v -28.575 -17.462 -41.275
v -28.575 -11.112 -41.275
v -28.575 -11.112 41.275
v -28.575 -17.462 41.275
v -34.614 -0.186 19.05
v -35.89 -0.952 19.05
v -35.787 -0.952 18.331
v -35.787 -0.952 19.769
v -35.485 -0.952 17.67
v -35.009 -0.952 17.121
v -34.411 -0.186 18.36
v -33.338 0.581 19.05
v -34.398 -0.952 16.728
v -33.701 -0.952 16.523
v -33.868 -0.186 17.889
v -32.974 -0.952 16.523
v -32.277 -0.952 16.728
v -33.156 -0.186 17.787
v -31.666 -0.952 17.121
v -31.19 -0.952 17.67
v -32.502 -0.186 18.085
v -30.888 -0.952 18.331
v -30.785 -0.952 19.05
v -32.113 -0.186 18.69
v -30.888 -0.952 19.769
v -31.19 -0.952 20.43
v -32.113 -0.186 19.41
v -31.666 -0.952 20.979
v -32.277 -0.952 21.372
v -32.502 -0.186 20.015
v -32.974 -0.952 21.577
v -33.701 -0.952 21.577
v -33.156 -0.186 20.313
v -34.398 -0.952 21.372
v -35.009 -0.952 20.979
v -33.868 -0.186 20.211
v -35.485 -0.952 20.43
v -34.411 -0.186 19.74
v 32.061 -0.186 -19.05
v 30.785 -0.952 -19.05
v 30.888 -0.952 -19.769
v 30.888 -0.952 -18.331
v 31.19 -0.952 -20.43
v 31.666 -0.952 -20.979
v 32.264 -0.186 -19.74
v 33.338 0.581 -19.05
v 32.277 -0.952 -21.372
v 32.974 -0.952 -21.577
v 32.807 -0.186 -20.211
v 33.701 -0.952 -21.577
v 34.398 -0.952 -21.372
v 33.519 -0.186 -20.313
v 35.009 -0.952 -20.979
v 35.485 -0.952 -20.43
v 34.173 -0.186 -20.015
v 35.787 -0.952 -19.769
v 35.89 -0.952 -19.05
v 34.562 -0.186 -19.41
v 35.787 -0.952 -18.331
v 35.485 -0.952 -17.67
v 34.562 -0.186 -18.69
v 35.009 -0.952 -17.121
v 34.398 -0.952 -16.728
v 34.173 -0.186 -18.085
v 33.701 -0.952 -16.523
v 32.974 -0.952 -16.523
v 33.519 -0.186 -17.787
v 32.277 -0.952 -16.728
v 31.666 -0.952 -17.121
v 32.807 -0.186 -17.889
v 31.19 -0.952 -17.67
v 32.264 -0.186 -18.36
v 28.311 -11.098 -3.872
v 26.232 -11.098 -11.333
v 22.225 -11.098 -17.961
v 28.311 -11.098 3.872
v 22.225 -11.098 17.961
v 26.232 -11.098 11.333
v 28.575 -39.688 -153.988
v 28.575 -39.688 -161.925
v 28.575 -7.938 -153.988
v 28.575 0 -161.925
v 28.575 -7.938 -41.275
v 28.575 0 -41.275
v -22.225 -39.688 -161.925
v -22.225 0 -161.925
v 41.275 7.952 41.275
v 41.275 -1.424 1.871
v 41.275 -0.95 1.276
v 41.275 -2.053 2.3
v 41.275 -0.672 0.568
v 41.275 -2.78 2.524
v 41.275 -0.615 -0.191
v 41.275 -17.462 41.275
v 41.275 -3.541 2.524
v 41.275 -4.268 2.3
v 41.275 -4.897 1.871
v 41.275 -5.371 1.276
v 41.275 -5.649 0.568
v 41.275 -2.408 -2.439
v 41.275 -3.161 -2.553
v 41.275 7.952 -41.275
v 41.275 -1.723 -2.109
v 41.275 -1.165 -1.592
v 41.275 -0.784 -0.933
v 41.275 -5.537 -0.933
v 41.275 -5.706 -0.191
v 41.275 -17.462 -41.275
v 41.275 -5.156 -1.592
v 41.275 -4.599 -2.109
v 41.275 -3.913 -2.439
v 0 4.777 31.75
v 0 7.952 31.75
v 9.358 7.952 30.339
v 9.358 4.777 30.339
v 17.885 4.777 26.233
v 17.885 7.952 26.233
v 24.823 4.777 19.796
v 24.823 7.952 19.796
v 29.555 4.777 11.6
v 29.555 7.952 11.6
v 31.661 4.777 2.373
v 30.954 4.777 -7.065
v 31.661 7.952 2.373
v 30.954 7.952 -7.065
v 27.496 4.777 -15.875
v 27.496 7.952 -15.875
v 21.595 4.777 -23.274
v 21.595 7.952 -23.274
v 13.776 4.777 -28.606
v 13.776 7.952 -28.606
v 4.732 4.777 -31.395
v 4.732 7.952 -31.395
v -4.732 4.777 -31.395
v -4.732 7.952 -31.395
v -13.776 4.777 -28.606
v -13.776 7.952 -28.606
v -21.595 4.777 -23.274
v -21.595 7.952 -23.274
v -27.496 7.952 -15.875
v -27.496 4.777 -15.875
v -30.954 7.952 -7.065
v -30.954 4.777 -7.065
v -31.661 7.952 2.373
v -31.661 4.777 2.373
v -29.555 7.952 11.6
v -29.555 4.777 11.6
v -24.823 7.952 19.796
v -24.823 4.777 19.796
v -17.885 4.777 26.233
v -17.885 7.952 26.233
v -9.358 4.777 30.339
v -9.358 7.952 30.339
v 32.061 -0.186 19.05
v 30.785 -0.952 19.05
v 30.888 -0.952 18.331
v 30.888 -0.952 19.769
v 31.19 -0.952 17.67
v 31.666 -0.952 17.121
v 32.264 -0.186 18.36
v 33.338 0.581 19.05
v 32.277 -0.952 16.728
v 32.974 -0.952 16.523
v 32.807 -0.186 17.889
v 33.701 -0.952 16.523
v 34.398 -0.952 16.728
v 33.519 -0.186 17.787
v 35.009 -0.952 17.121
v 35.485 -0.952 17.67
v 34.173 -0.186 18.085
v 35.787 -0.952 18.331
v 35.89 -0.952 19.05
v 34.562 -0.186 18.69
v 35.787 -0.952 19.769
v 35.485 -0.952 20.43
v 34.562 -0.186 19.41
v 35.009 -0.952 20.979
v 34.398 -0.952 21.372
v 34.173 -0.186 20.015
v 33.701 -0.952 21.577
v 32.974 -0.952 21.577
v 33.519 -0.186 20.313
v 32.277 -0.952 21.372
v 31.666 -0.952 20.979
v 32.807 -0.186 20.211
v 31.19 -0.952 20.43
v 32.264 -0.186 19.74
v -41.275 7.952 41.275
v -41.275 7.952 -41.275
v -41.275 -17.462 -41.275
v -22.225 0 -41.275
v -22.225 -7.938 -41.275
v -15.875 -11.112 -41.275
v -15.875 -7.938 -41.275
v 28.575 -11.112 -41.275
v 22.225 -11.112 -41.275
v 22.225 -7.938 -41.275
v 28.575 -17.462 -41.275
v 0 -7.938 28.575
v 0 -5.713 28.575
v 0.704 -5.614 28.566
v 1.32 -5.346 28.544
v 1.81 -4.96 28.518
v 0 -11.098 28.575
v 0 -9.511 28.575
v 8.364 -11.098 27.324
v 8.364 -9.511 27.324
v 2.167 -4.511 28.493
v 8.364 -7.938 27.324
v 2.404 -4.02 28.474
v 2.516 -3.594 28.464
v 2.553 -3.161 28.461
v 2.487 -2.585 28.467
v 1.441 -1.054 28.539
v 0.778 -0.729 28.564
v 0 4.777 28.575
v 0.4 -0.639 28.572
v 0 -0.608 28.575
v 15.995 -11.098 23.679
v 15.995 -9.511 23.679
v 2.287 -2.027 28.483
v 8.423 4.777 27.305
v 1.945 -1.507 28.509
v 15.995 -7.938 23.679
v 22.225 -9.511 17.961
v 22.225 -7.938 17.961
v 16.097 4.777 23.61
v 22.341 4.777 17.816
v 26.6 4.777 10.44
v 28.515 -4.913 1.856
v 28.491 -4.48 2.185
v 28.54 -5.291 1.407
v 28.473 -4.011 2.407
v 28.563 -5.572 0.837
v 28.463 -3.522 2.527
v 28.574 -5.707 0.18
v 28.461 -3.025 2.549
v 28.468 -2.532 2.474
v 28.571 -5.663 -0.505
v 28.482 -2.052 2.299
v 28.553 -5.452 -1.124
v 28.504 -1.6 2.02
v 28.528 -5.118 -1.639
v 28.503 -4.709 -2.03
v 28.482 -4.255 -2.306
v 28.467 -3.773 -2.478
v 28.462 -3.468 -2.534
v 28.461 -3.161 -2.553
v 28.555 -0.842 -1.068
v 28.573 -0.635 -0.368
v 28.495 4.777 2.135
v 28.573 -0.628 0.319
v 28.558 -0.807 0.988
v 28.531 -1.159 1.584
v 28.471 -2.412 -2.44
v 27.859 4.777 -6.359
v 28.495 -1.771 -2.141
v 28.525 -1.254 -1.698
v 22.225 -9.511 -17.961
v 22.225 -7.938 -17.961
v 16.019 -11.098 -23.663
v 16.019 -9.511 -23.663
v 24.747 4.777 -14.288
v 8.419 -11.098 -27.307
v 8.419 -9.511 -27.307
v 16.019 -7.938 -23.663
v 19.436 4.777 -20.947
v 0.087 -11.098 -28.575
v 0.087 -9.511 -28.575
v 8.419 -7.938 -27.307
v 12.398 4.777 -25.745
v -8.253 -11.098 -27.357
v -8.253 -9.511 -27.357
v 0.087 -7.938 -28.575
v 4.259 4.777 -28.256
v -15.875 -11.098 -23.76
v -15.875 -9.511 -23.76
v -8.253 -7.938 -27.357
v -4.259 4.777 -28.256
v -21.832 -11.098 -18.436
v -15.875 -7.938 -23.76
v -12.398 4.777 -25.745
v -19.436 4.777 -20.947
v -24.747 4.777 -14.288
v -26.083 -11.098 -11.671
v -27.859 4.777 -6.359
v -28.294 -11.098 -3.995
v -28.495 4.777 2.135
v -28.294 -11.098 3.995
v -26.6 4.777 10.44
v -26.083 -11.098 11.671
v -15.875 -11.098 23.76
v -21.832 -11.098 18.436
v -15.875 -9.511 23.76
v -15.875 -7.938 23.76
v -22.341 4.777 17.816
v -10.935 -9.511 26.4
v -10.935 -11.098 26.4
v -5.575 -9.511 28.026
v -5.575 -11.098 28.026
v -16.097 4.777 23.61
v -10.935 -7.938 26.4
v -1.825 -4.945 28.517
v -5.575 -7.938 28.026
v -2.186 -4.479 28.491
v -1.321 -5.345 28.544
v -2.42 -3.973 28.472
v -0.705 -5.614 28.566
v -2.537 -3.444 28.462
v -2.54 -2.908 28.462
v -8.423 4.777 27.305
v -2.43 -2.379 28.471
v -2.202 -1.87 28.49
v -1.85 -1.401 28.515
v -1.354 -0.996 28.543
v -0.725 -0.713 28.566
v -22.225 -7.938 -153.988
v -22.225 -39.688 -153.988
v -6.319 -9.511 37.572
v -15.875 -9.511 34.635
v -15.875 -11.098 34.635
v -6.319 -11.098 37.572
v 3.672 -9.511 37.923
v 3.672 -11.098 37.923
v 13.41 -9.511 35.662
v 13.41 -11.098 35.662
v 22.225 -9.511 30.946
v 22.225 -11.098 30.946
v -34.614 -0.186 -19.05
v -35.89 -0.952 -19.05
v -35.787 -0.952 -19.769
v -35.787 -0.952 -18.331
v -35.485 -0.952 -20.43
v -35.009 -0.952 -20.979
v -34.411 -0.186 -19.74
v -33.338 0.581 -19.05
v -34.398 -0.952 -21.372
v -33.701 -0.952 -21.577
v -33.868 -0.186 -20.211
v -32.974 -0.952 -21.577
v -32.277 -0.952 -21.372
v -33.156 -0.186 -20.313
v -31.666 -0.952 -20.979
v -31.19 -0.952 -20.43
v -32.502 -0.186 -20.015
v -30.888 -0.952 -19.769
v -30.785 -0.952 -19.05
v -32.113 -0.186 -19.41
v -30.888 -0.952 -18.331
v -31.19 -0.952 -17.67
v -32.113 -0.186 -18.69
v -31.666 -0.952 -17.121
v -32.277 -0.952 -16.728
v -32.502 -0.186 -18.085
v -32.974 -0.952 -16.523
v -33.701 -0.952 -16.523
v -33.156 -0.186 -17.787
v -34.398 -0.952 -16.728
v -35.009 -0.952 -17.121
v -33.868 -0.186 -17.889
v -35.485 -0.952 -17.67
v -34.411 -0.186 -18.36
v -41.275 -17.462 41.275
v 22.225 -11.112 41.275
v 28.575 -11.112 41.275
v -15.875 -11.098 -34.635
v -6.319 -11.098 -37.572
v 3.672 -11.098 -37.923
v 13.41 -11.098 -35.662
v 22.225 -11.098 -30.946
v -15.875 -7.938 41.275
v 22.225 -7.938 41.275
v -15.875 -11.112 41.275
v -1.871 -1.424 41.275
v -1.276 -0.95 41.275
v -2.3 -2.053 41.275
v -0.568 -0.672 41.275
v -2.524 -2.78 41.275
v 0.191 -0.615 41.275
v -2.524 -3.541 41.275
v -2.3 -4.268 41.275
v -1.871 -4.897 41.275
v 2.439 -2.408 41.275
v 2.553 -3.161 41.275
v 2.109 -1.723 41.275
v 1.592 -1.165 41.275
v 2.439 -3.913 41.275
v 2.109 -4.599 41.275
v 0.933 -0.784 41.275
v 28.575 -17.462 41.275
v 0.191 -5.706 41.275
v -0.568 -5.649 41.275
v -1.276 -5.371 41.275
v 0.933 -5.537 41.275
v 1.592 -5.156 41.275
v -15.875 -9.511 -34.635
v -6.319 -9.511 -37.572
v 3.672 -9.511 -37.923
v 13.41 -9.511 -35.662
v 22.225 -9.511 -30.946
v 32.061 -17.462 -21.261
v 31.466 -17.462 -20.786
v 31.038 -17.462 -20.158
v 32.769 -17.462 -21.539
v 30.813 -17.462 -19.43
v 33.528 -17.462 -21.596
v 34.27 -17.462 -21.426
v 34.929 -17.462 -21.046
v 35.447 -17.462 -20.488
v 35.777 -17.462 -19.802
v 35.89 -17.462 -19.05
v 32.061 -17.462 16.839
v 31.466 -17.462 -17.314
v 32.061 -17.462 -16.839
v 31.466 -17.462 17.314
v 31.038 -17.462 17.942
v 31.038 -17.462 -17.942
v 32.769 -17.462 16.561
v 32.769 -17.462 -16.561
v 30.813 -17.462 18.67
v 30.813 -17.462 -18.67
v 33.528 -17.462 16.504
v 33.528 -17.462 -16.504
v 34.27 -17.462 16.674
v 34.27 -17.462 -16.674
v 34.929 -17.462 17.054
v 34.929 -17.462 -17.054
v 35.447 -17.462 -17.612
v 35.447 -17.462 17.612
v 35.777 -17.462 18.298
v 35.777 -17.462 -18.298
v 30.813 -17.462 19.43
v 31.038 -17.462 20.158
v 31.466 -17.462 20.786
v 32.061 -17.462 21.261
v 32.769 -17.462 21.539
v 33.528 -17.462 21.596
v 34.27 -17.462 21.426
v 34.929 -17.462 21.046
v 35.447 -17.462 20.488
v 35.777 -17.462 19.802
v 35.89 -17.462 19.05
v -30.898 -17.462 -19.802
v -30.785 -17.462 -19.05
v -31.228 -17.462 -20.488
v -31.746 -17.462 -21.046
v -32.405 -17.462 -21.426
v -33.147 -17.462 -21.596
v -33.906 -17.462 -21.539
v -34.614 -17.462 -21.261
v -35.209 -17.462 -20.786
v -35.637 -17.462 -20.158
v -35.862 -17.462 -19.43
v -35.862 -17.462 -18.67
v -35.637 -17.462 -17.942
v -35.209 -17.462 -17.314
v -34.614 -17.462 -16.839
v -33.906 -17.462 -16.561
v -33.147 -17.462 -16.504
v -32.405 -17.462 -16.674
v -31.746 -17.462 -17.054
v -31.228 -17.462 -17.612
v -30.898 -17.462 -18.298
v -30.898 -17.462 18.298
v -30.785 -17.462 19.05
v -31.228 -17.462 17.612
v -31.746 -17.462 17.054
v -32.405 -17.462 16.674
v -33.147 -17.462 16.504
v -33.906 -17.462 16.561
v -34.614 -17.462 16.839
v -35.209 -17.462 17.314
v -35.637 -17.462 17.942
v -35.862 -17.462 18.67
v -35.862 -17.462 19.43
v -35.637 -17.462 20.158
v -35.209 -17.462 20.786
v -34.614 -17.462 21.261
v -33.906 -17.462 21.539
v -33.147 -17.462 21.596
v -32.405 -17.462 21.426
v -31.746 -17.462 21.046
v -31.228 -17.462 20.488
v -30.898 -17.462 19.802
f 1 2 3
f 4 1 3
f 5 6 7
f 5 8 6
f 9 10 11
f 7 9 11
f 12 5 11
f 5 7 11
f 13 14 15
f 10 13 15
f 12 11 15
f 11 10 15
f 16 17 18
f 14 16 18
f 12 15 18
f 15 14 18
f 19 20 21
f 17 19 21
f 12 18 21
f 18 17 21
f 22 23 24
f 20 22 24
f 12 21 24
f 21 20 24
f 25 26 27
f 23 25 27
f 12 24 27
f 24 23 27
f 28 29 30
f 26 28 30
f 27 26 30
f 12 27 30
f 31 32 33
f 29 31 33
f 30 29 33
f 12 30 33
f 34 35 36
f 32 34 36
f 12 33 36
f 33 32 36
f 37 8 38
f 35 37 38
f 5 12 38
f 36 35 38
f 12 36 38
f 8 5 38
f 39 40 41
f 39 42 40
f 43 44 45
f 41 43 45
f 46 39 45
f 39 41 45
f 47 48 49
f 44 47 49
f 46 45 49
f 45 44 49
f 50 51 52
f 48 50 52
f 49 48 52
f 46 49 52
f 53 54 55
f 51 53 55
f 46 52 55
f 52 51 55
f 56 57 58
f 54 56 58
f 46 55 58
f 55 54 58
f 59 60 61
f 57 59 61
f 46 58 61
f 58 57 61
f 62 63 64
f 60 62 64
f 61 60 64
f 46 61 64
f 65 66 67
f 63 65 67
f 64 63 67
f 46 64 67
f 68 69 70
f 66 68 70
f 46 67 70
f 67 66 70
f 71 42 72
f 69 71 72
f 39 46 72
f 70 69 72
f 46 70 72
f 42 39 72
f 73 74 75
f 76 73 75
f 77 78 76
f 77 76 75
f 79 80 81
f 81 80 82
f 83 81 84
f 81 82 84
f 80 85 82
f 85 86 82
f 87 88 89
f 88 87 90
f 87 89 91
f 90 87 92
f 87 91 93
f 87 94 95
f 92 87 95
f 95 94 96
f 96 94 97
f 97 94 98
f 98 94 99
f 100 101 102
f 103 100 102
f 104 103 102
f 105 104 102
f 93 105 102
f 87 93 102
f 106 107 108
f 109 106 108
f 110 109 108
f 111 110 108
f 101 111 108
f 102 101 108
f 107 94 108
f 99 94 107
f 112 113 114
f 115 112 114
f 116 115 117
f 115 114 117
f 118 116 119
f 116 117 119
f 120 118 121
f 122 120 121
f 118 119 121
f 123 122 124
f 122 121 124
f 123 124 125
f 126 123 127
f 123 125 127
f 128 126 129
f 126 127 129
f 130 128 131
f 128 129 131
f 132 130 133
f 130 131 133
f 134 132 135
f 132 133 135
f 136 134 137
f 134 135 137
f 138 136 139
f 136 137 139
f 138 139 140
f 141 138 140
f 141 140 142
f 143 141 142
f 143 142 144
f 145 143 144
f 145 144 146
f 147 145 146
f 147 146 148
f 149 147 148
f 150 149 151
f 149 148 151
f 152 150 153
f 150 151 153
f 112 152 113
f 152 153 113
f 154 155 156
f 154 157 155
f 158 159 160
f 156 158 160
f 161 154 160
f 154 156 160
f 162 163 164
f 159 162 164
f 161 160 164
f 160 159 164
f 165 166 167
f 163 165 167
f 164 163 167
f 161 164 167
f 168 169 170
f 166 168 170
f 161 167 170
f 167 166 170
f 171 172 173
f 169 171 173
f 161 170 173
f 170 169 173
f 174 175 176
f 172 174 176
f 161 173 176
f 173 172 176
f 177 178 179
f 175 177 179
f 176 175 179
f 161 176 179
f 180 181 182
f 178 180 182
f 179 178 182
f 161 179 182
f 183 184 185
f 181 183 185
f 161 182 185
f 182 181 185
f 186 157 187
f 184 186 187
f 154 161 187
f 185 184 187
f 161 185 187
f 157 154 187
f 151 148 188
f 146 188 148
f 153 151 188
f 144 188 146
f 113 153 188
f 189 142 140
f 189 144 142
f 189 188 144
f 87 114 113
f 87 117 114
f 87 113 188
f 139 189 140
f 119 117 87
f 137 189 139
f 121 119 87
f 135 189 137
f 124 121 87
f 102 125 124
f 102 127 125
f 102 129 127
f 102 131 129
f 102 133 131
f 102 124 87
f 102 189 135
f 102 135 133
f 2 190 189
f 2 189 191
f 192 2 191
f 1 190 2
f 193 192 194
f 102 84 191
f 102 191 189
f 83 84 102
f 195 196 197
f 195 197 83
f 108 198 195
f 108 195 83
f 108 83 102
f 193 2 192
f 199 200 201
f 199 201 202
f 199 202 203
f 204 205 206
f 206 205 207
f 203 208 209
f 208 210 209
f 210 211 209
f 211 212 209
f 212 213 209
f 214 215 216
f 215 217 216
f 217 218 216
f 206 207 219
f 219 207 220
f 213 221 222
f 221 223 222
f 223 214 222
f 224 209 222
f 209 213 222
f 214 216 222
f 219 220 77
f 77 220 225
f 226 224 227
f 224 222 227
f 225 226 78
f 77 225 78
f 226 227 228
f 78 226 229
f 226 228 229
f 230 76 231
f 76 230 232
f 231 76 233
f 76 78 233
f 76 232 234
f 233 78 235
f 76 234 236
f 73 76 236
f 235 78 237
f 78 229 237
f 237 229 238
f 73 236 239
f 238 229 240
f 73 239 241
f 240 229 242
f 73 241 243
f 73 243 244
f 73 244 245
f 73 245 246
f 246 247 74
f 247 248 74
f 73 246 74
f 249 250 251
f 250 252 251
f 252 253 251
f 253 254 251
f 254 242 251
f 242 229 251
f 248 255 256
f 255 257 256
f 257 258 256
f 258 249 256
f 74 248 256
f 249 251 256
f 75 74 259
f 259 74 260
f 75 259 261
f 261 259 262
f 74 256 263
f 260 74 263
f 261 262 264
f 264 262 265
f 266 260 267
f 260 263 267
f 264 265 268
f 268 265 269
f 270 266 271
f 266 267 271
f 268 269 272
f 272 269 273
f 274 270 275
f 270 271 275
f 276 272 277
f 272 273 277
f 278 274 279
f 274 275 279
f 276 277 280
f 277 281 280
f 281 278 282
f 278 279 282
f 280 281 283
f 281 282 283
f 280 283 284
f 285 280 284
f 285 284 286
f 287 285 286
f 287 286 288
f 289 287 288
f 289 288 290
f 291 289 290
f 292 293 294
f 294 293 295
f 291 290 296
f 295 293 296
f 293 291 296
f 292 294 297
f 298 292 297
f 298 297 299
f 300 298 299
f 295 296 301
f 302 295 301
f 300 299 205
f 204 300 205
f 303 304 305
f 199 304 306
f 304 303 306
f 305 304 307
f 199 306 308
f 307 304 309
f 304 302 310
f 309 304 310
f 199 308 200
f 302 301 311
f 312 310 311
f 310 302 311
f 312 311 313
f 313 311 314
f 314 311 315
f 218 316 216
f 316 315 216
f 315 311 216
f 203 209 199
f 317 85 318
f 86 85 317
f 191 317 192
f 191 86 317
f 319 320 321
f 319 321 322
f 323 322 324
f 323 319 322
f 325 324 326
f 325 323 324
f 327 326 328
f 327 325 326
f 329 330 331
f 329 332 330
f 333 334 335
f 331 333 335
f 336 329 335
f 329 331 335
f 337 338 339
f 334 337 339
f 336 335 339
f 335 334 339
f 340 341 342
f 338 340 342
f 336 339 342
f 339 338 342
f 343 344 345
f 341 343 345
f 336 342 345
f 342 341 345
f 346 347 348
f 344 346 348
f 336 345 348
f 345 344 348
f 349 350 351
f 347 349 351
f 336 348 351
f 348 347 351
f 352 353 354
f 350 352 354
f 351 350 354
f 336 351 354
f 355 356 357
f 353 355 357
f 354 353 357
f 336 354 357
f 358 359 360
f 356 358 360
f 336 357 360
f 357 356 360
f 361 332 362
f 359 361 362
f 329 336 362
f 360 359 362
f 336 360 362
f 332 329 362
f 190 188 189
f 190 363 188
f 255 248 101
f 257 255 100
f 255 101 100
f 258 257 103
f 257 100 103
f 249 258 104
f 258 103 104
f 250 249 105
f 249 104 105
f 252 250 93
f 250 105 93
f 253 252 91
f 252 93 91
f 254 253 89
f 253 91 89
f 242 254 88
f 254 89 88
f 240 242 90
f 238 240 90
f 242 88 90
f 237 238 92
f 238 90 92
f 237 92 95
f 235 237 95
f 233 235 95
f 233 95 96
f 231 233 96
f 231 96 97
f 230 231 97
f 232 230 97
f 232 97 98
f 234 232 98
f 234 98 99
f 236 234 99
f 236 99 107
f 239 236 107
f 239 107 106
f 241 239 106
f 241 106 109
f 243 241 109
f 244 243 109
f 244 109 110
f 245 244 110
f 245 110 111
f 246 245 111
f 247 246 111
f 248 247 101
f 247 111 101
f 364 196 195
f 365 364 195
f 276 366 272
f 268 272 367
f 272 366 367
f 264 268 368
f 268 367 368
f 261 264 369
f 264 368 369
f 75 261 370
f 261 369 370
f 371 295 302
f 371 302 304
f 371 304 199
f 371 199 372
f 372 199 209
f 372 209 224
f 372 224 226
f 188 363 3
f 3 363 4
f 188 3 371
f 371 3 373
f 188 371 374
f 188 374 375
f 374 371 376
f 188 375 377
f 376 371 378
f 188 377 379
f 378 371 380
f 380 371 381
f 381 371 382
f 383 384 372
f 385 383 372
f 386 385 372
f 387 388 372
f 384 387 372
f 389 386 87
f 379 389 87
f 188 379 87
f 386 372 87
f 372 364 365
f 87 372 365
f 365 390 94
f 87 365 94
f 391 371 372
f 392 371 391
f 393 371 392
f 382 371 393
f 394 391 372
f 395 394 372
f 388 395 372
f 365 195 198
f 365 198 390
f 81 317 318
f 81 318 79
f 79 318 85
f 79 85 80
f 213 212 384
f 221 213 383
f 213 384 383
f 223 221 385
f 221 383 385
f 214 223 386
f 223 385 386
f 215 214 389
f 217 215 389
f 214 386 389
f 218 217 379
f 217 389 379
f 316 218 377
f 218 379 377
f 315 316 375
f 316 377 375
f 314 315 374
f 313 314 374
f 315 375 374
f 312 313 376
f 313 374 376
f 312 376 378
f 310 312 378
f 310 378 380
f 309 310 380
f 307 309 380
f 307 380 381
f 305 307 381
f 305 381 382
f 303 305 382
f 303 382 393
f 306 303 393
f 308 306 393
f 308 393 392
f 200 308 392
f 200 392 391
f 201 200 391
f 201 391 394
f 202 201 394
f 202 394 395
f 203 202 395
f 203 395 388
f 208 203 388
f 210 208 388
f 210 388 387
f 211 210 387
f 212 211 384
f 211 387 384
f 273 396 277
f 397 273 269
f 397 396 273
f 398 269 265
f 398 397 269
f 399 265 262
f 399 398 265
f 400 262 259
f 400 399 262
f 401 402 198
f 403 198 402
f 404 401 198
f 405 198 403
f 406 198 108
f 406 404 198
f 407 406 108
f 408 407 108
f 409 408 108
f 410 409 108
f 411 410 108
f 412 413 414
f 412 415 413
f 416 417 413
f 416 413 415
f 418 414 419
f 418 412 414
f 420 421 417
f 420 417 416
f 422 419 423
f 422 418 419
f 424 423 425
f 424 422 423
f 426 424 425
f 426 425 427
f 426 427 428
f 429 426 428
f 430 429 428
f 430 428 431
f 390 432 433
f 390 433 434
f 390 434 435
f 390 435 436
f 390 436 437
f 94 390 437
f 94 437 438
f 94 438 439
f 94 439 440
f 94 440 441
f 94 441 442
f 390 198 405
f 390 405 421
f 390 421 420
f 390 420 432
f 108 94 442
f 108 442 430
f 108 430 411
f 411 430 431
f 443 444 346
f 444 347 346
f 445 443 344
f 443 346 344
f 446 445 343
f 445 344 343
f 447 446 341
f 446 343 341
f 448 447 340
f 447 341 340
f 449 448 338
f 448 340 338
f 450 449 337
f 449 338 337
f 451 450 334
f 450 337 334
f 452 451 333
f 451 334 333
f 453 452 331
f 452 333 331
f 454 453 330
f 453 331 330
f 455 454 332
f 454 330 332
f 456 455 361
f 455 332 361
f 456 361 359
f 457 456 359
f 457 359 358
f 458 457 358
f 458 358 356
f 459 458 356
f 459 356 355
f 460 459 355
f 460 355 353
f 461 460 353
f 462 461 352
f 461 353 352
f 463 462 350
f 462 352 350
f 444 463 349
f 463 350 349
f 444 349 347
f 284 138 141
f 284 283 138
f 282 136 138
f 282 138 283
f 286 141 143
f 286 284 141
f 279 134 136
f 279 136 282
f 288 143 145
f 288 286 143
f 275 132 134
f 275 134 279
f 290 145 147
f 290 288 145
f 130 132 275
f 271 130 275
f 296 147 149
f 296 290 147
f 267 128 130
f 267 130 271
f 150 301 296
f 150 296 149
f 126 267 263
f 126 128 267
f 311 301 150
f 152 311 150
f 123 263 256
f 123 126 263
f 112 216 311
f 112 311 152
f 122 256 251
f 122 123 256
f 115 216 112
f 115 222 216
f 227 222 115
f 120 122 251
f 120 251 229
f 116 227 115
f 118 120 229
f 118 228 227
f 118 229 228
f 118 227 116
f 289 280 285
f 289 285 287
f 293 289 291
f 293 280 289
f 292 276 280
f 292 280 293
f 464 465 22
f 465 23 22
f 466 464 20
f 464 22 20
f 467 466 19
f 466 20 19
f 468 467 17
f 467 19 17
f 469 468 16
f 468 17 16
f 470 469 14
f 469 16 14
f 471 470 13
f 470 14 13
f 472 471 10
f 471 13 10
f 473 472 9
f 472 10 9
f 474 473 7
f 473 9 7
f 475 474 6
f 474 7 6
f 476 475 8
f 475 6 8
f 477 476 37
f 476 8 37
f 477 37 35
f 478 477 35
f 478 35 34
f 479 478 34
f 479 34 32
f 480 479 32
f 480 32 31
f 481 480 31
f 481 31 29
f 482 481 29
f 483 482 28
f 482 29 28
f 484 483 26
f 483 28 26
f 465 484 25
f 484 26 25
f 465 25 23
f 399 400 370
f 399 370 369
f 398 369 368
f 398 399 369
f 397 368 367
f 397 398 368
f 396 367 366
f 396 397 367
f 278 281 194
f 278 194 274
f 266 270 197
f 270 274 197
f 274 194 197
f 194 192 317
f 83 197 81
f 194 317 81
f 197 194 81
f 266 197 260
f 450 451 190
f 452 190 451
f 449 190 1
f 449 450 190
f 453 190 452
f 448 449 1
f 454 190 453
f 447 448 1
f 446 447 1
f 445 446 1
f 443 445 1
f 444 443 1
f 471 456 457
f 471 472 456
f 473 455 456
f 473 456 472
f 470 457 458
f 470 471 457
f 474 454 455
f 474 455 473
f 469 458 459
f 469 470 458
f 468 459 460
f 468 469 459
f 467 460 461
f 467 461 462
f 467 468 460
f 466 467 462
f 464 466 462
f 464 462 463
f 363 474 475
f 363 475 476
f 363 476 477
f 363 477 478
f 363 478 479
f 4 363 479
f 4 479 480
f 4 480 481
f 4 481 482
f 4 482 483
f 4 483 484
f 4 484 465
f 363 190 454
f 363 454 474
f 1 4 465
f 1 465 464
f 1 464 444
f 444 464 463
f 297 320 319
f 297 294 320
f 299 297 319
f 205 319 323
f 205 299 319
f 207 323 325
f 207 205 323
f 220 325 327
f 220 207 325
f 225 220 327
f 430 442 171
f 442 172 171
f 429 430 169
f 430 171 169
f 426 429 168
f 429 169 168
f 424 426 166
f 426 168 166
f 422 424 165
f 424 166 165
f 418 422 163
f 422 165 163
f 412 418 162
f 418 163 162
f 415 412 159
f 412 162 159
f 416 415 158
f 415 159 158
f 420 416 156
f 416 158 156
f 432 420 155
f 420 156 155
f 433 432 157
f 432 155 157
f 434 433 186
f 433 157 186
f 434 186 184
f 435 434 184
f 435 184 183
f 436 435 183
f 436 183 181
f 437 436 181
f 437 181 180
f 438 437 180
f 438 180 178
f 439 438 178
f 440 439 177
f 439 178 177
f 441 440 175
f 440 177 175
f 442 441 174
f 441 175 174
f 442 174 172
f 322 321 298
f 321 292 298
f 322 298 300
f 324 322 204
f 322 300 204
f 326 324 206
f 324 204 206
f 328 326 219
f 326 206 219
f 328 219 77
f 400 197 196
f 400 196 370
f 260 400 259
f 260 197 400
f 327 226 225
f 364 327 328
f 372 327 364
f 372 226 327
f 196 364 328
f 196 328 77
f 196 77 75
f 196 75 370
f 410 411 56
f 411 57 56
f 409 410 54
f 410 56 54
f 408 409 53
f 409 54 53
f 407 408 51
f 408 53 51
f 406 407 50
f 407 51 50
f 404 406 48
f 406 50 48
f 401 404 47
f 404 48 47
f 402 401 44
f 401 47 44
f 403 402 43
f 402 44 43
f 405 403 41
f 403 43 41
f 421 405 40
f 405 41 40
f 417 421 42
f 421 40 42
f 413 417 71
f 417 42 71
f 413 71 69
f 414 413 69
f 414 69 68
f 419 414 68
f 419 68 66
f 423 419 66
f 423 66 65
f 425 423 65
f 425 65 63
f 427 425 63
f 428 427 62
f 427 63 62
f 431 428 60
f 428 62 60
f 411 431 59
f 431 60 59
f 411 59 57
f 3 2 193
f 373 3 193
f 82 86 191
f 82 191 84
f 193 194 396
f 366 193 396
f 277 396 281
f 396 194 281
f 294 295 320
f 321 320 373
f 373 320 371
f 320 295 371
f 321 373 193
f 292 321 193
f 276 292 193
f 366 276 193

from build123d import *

# Parameters (mm, degrees)
BOSS_EXTRUDE1_DEPTH          = 7.9375
SKETCH2_W                    = 50.8
SKETCH2_H                    = 7.9375
BOSS_EXTRUDE2_DEPTH          = 31.75
SKETCH8_W                    = 82.55
SKETCH8_H                    = 82.55
BOSS_EXTRUDE6_DEPTH          = 7.9375
SKETCH10_R                   = 6.35
CENTER_HOLE_DEPTH            = 15.875
SKETCH12_W                   = 12.7
SKETCH12_H                   = 82.55
CLAMP_PAD_DEPTH              = 9.525
SKETCH13_W                   = 12.7
SKETCH13_H                   = 82.55
SKETCH13_W_2                 = 6.35
WEAR_PAD_DEPTH               = 3.175
SKETCH14_W                   = 82.55
SKETCH14_H                   = 82.55
BOSS_EXTRUDE10_DEPTH         = 0.014283
SKETCH15_R                   = 28.575
CUT_EXTRUDE3_DEPTH           = 19.05
BOSS_EXTRUDE7_START          = 1.5875
SKETCH11_R                   = 38.1
SKETCH11_R_2                 = 28.575
BOSS_EXTRUDE7_DEPTH          = 1.5875
SKETCH24_R                   = 31.75
CUT_EXTRUDE4_DEPTH           = 3.175
F_1_4_20_TAPPED_HOLE5_REACH  = 213.114
F_1_4_20_TAPPED_HOLE5_BORE_R = 2.5527
F_1_4_20_TAPPED_HOLE6_REACH  = 188.036
F_1_4_20_TAPPED_HOLE6_BORE_R = 2.5527
F_1_4_20_TAPPED_HOLE7_D      = 5.1054
F_1_4_20_TAPPED_HOLE7_DEPTH  = 16.51
F_1_4_20_TAPPED_HOLE7_TIP    = 1.533816902
F_1_4_20_TAPPED_HOLE8_D      = 5.1054
F_1_4_20_TAPPED_HOLE8_DEPTH  = 16.51
F_1_4_20_TAPPED_HOLE8_TIP    = 1.533816902


with BuildPart() as part:
    # Sketch1 → Boss-Extrude1 (new body)
    with BuildSketch(Plane(origin=(0, 0, 0), x_dir=(1, 0, 0), z_dir=(0, 1, 0))):
        Polygon((-22.225, 41.275), (-41.275, 41.275), (-41.275, -41.275), (41.275, -41.275), (41.275, 41.275), (28.575, 41.275), (28.575, 161.925), (-22.225, 161.925), align=None)
    extrude(amount=-BOSS_EXTRUDE1_DEPTH)

    # Sketch2 → Boss-Extrude2 (add)
    with BuildSketch(Plane.XZ.offset(7.9375)):
        with Locations((3.175, -157.95625)):
            Rectangle(SKETCH2_W, SKETCH2_H)
    extrude(amount=BOSS_EXTRUDE2_DEPTH)

    # Sketch8 → Boss-Extrude6 (add)
    with BuildSketch(Plane(origin=(0, 0, 0), x_dir=(1, 0, 0), z_dir=(0, 1, 0))):
        Rectangle(SKETCH8_W, SKETCH8_H)
    extrude(amount=BOSS_EXTRUDE6_DEPTH)

    # Sketch10 → Center Hole (cut)
    with BuildSketch(Plane(origin=(0, 7.9375, 0), x_dir=(1, 0, 0), z_dir=(0, 1, 0))):
        with Locations(Location((0, 0, 0), (0, 0, 270))):
            Circle(SKETCH10_R)
    extrude(amount=-CENTER_HOLE_DEPTH, mode=Mode.SUBTRACT)

    # Sketch12 → Clamp Pad (add)
    with BuildSketch(Plane.XZ.offset(7.9375)):
        with Locations((-34.925, 0)):
            Rectangle(SKETCH12_W, SKETCH12_H)
        with Locations((34.925, 0)):
            Rectangle(SKETCH12_W, SKETCH12_H)
    extrude(amount=CLAMP_PAD_DEPTH)

    # Sketch13 → Wear Pad (add)
    with BuildSketch(Plane.XZ.offset(7.9375)):
        with Locations((-22.225, 0)):
            Rectangle(SKETCH13_W, SKETCH13_H)
        with Locations((25.4, 0)):
            Rectangle(SKETCH13_W_2, SKETCH13_H)
    extrude(amount=WEAR_PAD_DEPTH)

    # Sketch14 → Boss-Extrude10 (add)
    with BuildSketch(Plane(origin=(0, 7.9375, 0), x_dir=(1, 0, 0), z_dir=(0, 1, 0))):
        Rectangle(SKETCH14_W, SKETCH14_H)
    extrude(amount=BOSS_EXTRUDE10_DEPTH)

    # Sketch15 → Cut-Extrude3 (cut)
    with BuildSketch(Plane(origin=(0, 7.951783292, 0), x_dir=(1, 0, 0), z_dir=(0, 1, 0))):
        with Locations(Location((0, 0, 0), (0, 0, 270))):
            Circle(SKETCH15_R)
    extrude(amount=-CUT_EXTRUDE3_DEPTH, mode=Mode.SUBTRACT)

    # Sketch11 → Boss-Extrude7 (add)
    with BuildSketch(Plane(origin=(0, -11.098216708, 0), x_dir=(1, 0, 0), z_dir=(0, 1, 0)).offset(BOSS_EXTRUDE7_START)):
        Circle(SKETCH11_R)
        with Locations(Location((0, 0, 0), (0, 0, 270))):
            Circle(SKETCH11_R_2, mode=Mode.SUBTRACT)
    extrude(amount=-BOSS_EXTRUDE7_DEPTH)

    # Sketch24 → Cut-Extrude4 (cut)
    with BuildSketch(Plane(origin=(0, 7.951783292, 0), x_dir=(1, 0, 0), z_dir=(0, 1, 0))):
        with Locations(Location((0, 0, 0), (0, 0, 270))):
            Circle(SKETCH24_R)
    extrude(amount=-CUT_EXTRUDE4_DEPTH, mode=Mode.SUBTRACT)

    # 1/4-20 Tapped Hole5 bore → 1/4-20 Tapped Hole5 (cut, up to next)
    with BuildSketch(Plane.XY.offset(41.275), mode=Mode.PRIVATE) as f_1_4_20_tapped_hole5_sk1:
        with Locations((0, -3.160716708)):
            Circle(F_1_4_20_TAPPED_HOLE5_BORE_R)
    f_1_4_20_tapped_hole5_tool1 = extrude(f_1_4_20_tapped_hole5_sk1.sketch, amount=-F_1_4_20_TAPPED_HOLE5_REACH, mode=Mode.PRIVATE) & part.part
    add(f_1_4_20_tapped_hole5_tool1.solids().sort_by_distance((0, -3.160717, 41.275))[0], mode=Mode.SUBTRACT)

    # 1/4-20 Tapped Hole6 bore → 1/4-20 Tapped Hole6 (cut, up to next)
    with BuildSketch(Plane(origin=(41.275, 0, 0), x_dir=(0, 0, -1), z_dir=(1, 0, 0)), mode=Mode.PRIVATE) as f_1_4_20_tapped_hole6_sk1:
        with Locations((0, -3.160716708)):
            Circle(F_1_4_20_TAPPED_HOLE6_BORE_R)
    f_1_4_20_tapped_hole6_tool1 = extrude(f_1_4_20_tapped_hole6_sk1.sketch, amount=-F_1_4_20_TAPPED_HOLE6_REACH, mode=Mode.PRIVATE) & part.part
    add(f_1_4_20_tapped_hole6_tool1.solids().sort_by_distance((41.275, -3.160717, 0))[0], mode=Mode.SUBTRACT)

    # 1/4-20 Tapped Hole7
    with Locations(Plane(origin=(0, -17.4625, 0), x_dir=(-1, 0, 0), z_dir=(0, -1, 0))):
        with Locations((33.3375, 19.05), (33.3375, -19.05)):
            Hole(F_1_4_20_TAPPED_HOLE7_D / 2, depth=F_1_4_20_TAPPED_HOLE7_DEPTH)
            with Locations((0, 0, -(F_1_4_20_TAPPED_HOLE7_DEPTH + F_1_4_20_TAPPED_HOLE7_TIP / 2))):  # 118° drill point
                Cone(0, F_1_4_20_TAPPED_HOLE7_D / 2, F_1_4_20_TAPPED_HOLE7_TIP, mode=Mode.SUBTRACT)

    # 1/4-20 Tapped Hole8
    with Locations(Plane(origin=(0, -17.4625, 0), x_dir=(-1, 0, 0), z_dir=(0, -1, 0))):
        with Locations((-33.3375, 19.05), (-33.3375, -19.05)):
            Hole(F_1_4_20_TAPPED_HOLE8_D / 2, depth=F_1_4_20_TAPPED_HOLE8_DEPTH)
            with Locations((0, 0, -(F_1_4_20_TAPPED_HOLE8_DEPTH + F_1_4_20_TAPPED_HOLE8_TIP / 2))):  # 118° drill point
                Cone(0, F_1_4_20_TAPPED_HOLE8_D / 2, F_1_4_20_TAPPED_HOLE8_TIP, mode=Mode.SUBTRACT)


solid = part.part
